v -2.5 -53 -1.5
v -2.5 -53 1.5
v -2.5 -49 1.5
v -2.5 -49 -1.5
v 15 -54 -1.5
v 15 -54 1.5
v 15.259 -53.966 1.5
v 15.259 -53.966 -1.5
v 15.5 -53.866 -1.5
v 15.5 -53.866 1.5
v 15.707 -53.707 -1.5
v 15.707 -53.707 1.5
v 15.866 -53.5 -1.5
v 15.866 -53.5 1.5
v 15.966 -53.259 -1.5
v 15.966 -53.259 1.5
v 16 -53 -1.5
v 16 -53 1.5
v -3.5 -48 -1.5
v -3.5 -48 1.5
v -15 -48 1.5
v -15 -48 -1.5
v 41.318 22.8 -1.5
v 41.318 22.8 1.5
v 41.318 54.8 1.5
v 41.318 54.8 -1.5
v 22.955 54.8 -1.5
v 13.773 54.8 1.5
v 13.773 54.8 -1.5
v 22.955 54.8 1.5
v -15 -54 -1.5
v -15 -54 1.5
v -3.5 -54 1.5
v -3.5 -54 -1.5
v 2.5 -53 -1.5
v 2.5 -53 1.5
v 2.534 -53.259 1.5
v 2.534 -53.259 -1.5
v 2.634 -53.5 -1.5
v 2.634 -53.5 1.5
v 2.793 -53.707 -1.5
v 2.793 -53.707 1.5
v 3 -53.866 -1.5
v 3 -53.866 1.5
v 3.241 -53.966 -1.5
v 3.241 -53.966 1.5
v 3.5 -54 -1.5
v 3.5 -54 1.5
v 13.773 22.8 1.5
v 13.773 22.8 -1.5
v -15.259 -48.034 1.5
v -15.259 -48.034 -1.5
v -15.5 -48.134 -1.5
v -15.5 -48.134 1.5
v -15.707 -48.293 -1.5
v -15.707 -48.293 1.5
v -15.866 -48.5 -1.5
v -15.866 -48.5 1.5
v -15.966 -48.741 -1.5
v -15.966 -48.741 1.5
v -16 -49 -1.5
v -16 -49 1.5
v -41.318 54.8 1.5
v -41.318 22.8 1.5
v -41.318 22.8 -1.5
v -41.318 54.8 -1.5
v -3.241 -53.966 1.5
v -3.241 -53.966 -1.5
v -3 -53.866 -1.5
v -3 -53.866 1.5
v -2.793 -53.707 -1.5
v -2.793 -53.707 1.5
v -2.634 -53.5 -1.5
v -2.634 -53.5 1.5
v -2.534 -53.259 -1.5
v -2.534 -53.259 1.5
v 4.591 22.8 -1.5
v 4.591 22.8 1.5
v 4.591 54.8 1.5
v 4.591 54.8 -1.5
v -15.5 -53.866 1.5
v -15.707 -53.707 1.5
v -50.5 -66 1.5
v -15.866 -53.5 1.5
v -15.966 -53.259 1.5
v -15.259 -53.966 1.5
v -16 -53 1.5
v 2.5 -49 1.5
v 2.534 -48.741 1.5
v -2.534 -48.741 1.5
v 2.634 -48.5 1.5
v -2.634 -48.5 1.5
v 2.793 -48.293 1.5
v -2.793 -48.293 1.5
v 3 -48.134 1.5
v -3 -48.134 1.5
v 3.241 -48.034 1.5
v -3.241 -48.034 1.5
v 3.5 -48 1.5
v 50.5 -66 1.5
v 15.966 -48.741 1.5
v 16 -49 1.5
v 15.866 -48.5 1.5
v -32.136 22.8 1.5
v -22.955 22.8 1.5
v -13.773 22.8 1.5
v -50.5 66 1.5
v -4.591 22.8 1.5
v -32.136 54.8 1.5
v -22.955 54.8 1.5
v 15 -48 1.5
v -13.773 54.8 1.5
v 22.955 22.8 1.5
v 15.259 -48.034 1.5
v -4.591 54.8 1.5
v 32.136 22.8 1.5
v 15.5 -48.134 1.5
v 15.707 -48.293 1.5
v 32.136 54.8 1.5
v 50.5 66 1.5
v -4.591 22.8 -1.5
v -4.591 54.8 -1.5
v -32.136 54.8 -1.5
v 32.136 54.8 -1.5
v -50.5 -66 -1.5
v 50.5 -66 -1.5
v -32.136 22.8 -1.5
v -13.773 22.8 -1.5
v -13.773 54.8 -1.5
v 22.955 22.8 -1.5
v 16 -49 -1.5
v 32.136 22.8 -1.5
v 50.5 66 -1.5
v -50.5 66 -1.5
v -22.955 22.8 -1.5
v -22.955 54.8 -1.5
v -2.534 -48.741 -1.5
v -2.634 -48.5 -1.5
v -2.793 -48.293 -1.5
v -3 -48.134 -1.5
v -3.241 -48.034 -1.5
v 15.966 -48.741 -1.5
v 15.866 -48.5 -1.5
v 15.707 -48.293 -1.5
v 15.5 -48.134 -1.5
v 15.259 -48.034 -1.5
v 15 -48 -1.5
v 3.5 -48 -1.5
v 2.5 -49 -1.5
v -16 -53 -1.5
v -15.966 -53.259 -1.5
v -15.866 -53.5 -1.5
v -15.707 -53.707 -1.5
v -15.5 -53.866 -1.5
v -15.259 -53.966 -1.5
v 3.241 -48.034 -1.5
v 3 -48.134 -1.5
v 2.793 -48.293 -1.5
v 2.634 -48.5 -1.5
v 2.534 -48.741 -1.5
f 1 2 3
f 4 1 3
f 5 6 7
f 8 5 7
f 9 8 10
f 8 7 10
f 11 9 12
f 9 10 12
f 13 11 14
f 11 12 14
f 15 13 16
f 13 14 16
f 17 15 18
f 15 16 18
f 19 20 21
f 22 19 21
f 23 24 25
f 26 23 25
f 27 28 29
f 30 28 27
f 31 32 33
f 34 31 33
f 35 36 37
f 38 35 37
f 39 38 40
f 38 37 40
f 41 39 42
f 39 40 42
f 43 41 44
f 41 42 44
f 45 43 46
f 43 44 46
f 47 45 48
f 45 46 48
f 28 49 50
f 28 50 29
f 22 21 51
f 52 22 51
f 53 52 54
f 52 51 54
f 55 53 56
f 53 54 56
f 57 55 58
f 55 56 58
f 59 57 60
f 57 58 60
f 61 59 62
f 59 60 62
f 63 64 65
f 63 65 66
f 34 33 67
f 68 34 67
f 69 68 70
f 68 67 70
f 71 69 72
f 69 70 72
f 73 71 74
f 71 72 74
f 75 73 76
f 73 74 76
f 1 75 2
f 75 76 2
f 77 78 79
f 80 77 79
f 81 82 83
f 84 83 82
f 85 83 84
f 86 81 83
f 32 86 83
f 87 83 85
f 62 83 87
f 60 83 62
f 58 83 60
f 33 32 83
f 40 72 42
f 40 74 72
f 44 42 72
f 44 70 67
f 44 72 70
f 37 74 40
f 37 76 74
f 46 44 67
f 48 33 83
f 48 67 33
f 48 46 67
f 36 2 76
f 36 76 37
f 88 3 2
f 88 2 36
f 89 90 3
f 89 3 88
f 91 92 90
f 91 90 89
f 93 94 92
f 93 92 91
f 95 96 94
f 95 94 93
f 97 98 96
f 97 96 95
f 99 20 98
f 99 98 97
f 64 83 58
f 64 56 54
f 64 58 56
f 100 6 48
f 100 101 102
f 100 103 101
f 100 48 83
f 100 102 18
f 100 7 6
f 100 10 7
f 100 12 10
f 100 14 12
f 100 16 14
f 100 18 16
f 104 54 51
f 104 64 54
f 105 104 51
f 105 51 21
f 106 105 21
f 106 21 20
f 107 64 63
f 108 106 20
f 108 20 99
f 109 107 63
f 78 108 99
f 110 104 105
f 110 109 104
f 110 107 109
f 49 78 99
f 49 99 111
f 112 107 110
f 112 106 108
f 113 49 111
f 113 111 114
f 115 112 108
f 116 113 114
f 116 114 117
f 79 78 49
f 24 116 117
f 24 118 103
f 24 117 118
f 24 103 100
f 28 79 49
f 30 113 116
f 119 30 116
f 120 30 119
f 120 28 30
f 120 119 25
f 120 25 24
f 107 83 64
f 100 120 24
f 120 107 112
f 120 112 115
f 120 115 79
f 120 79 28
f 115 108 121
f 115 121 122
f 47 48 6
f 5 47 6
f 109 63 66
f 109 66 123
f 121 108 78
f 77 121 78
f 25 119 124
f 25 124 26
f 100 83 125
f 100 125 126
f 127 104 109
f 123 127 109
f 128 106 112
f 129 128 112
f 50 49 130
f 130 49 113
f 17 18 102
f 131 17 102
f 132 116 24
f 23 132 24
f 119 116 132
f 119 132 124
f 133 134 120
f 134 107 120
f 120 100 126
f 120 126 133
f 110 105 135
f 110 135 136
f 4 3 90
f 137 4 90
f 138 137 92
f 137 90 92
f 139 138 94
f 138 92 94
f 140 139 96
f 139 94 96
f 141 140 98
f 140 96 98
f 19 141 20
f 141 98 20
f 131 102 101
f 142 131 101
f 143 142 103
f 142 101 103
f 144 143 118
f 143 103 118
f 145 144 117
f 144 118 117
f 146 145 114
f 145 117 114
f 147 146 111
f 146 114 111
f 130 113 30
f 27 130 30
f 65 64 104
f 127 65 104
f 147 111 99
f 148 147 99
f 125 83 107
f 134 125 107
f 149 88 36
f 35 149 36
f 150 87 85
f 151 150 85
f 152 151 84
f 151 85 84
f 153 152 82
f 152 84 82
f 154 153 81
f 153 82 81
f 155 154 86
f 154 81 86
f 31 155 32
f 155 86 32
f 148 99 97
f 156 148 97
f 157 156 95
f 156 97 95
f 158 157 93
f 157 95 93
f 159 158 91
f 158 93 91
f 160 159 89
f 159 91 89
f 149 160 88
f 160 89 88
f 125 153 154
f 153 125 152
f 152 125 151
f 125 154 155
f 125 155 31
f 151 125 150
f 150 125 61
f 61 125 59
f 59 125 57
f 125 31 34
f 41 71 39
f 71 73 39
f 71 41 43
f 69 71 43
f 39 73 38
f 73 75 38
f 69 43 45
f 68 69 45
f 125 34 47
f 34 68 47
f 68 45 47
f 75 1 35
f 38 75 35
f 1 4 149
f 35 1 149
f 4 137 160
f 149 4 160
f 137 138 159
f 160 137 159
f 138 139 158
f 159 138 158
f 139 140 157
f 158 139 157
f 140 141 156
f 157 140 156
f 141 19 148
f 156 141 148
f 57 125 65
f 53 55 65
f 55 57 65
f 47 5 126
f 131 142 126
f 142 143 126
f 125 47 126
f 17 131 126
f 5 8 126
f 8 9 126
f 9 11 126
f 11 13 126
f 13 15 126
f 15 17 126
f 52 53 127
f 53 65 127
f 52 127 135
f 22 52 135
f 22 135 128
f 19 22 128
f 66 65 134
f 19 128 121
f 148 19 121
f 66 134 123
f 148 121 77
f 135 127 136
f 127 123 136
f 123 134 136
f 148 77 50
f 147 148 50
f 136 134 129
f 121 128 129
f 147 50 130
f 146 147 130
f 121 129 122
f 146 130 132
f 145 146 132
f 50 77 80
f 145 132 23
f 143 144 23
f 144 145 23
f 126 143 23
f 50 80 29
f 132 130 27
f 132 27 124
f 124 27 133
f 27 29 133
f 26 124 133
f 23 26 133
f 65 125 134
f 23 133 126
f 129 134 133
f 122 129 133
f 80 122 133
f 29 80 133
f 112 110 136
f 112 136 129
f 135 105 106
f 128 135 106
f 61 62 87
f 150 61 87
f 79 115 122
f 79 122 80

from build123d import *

# Parameters (mm, degrees)
SKETCH1_W           = 101
SKETCH1_H           = 132
BOSS_EXTRUDE1_DEPTH = 1.5
SKETCH2_W           = 9.181818182
SKETCH2_H           = 32
CUT_EXTRUDE1_DEPTH  = 84.157982179


with BuildPart() as part:
    # Sketch1 → Boss-Extrude1 (new, symmetric)
    with BuildSketch(Plane.XY):
        Rectangle(SKETCH1_W, SKETCH1_H)
    extrude(amount=BOSS_EXTRUDE1_DEPTH, both=True)

    # Sketch2 → Cut-Extrude1 (cut, through all)
    with BuildSketch(Plane.XY.offset(1.5)):
        with BuildLine():
            Line((3.5, -54), (15, -54))
            ThreePointArc((15, -54), (15.707106781, -53.707106781), (16, -53))
            Line((16, -53), (16, -49))
            ThreePointArc((16, -49), (15.707106781, -48.292893219), (15, -48))
            Line((15, -48), (3.5, -48))
            ThreePointArc((3.5, -48), (2.792893219, -48.292893219), (2.5, -49))
            Line((2.5, -49), (2.5, -53))
            ThreePointArc((2.5, -53), (2.792893219, -53.707106781), (3.5, -54))
        make_face()
        with Locations((-36.727272727, 38.8)):
            Rectangle(SKETCH2_W, SKETCH2_H)
        with Locations((-18.363636364, 38.8)):
            Rectangle(SKETCH2_W, SKETCH2_H)
        with Locations((0, 38.8)):
            Rectangle(SKETCH2_W, SKETCH2_H)
        with Locations((18.363636364, 38.8)):
            Rectangle(SKETCH2_W, SKETCH2_H)
        with Locations((36.727272727, 38.8)):
            Rectangle(SKETCH2_W, SKETCH2_H)
        with BuildLine():
            Line((-15, -54), (-3.5, -54))
            ThreePointArc((-3.5, -54), (-2.792893219, -53.707106781), (-2.5, -53))
            Line((-2.5, -53), (-2.5, -49))
            ThreePointArc((-2.5, -49), (-2.792893219, -48.292893219), (-3.5, -48))
            Line((-3.5, -48), (-15, -48))
            ThreePointArc((-15, -48), (-15.707106781, -48.292893219), (-16, -49))
            Line((-16, -49), (-16, -53))
            ThreePointArc((-16, -53), (-15.707106781, -53.707106781), (-15, -54))
        make_face()
    extrude(amount=-CUT_EXTRUDE1_DEPTH, mode=Mode.SUBTRACT)


solid = part.part
